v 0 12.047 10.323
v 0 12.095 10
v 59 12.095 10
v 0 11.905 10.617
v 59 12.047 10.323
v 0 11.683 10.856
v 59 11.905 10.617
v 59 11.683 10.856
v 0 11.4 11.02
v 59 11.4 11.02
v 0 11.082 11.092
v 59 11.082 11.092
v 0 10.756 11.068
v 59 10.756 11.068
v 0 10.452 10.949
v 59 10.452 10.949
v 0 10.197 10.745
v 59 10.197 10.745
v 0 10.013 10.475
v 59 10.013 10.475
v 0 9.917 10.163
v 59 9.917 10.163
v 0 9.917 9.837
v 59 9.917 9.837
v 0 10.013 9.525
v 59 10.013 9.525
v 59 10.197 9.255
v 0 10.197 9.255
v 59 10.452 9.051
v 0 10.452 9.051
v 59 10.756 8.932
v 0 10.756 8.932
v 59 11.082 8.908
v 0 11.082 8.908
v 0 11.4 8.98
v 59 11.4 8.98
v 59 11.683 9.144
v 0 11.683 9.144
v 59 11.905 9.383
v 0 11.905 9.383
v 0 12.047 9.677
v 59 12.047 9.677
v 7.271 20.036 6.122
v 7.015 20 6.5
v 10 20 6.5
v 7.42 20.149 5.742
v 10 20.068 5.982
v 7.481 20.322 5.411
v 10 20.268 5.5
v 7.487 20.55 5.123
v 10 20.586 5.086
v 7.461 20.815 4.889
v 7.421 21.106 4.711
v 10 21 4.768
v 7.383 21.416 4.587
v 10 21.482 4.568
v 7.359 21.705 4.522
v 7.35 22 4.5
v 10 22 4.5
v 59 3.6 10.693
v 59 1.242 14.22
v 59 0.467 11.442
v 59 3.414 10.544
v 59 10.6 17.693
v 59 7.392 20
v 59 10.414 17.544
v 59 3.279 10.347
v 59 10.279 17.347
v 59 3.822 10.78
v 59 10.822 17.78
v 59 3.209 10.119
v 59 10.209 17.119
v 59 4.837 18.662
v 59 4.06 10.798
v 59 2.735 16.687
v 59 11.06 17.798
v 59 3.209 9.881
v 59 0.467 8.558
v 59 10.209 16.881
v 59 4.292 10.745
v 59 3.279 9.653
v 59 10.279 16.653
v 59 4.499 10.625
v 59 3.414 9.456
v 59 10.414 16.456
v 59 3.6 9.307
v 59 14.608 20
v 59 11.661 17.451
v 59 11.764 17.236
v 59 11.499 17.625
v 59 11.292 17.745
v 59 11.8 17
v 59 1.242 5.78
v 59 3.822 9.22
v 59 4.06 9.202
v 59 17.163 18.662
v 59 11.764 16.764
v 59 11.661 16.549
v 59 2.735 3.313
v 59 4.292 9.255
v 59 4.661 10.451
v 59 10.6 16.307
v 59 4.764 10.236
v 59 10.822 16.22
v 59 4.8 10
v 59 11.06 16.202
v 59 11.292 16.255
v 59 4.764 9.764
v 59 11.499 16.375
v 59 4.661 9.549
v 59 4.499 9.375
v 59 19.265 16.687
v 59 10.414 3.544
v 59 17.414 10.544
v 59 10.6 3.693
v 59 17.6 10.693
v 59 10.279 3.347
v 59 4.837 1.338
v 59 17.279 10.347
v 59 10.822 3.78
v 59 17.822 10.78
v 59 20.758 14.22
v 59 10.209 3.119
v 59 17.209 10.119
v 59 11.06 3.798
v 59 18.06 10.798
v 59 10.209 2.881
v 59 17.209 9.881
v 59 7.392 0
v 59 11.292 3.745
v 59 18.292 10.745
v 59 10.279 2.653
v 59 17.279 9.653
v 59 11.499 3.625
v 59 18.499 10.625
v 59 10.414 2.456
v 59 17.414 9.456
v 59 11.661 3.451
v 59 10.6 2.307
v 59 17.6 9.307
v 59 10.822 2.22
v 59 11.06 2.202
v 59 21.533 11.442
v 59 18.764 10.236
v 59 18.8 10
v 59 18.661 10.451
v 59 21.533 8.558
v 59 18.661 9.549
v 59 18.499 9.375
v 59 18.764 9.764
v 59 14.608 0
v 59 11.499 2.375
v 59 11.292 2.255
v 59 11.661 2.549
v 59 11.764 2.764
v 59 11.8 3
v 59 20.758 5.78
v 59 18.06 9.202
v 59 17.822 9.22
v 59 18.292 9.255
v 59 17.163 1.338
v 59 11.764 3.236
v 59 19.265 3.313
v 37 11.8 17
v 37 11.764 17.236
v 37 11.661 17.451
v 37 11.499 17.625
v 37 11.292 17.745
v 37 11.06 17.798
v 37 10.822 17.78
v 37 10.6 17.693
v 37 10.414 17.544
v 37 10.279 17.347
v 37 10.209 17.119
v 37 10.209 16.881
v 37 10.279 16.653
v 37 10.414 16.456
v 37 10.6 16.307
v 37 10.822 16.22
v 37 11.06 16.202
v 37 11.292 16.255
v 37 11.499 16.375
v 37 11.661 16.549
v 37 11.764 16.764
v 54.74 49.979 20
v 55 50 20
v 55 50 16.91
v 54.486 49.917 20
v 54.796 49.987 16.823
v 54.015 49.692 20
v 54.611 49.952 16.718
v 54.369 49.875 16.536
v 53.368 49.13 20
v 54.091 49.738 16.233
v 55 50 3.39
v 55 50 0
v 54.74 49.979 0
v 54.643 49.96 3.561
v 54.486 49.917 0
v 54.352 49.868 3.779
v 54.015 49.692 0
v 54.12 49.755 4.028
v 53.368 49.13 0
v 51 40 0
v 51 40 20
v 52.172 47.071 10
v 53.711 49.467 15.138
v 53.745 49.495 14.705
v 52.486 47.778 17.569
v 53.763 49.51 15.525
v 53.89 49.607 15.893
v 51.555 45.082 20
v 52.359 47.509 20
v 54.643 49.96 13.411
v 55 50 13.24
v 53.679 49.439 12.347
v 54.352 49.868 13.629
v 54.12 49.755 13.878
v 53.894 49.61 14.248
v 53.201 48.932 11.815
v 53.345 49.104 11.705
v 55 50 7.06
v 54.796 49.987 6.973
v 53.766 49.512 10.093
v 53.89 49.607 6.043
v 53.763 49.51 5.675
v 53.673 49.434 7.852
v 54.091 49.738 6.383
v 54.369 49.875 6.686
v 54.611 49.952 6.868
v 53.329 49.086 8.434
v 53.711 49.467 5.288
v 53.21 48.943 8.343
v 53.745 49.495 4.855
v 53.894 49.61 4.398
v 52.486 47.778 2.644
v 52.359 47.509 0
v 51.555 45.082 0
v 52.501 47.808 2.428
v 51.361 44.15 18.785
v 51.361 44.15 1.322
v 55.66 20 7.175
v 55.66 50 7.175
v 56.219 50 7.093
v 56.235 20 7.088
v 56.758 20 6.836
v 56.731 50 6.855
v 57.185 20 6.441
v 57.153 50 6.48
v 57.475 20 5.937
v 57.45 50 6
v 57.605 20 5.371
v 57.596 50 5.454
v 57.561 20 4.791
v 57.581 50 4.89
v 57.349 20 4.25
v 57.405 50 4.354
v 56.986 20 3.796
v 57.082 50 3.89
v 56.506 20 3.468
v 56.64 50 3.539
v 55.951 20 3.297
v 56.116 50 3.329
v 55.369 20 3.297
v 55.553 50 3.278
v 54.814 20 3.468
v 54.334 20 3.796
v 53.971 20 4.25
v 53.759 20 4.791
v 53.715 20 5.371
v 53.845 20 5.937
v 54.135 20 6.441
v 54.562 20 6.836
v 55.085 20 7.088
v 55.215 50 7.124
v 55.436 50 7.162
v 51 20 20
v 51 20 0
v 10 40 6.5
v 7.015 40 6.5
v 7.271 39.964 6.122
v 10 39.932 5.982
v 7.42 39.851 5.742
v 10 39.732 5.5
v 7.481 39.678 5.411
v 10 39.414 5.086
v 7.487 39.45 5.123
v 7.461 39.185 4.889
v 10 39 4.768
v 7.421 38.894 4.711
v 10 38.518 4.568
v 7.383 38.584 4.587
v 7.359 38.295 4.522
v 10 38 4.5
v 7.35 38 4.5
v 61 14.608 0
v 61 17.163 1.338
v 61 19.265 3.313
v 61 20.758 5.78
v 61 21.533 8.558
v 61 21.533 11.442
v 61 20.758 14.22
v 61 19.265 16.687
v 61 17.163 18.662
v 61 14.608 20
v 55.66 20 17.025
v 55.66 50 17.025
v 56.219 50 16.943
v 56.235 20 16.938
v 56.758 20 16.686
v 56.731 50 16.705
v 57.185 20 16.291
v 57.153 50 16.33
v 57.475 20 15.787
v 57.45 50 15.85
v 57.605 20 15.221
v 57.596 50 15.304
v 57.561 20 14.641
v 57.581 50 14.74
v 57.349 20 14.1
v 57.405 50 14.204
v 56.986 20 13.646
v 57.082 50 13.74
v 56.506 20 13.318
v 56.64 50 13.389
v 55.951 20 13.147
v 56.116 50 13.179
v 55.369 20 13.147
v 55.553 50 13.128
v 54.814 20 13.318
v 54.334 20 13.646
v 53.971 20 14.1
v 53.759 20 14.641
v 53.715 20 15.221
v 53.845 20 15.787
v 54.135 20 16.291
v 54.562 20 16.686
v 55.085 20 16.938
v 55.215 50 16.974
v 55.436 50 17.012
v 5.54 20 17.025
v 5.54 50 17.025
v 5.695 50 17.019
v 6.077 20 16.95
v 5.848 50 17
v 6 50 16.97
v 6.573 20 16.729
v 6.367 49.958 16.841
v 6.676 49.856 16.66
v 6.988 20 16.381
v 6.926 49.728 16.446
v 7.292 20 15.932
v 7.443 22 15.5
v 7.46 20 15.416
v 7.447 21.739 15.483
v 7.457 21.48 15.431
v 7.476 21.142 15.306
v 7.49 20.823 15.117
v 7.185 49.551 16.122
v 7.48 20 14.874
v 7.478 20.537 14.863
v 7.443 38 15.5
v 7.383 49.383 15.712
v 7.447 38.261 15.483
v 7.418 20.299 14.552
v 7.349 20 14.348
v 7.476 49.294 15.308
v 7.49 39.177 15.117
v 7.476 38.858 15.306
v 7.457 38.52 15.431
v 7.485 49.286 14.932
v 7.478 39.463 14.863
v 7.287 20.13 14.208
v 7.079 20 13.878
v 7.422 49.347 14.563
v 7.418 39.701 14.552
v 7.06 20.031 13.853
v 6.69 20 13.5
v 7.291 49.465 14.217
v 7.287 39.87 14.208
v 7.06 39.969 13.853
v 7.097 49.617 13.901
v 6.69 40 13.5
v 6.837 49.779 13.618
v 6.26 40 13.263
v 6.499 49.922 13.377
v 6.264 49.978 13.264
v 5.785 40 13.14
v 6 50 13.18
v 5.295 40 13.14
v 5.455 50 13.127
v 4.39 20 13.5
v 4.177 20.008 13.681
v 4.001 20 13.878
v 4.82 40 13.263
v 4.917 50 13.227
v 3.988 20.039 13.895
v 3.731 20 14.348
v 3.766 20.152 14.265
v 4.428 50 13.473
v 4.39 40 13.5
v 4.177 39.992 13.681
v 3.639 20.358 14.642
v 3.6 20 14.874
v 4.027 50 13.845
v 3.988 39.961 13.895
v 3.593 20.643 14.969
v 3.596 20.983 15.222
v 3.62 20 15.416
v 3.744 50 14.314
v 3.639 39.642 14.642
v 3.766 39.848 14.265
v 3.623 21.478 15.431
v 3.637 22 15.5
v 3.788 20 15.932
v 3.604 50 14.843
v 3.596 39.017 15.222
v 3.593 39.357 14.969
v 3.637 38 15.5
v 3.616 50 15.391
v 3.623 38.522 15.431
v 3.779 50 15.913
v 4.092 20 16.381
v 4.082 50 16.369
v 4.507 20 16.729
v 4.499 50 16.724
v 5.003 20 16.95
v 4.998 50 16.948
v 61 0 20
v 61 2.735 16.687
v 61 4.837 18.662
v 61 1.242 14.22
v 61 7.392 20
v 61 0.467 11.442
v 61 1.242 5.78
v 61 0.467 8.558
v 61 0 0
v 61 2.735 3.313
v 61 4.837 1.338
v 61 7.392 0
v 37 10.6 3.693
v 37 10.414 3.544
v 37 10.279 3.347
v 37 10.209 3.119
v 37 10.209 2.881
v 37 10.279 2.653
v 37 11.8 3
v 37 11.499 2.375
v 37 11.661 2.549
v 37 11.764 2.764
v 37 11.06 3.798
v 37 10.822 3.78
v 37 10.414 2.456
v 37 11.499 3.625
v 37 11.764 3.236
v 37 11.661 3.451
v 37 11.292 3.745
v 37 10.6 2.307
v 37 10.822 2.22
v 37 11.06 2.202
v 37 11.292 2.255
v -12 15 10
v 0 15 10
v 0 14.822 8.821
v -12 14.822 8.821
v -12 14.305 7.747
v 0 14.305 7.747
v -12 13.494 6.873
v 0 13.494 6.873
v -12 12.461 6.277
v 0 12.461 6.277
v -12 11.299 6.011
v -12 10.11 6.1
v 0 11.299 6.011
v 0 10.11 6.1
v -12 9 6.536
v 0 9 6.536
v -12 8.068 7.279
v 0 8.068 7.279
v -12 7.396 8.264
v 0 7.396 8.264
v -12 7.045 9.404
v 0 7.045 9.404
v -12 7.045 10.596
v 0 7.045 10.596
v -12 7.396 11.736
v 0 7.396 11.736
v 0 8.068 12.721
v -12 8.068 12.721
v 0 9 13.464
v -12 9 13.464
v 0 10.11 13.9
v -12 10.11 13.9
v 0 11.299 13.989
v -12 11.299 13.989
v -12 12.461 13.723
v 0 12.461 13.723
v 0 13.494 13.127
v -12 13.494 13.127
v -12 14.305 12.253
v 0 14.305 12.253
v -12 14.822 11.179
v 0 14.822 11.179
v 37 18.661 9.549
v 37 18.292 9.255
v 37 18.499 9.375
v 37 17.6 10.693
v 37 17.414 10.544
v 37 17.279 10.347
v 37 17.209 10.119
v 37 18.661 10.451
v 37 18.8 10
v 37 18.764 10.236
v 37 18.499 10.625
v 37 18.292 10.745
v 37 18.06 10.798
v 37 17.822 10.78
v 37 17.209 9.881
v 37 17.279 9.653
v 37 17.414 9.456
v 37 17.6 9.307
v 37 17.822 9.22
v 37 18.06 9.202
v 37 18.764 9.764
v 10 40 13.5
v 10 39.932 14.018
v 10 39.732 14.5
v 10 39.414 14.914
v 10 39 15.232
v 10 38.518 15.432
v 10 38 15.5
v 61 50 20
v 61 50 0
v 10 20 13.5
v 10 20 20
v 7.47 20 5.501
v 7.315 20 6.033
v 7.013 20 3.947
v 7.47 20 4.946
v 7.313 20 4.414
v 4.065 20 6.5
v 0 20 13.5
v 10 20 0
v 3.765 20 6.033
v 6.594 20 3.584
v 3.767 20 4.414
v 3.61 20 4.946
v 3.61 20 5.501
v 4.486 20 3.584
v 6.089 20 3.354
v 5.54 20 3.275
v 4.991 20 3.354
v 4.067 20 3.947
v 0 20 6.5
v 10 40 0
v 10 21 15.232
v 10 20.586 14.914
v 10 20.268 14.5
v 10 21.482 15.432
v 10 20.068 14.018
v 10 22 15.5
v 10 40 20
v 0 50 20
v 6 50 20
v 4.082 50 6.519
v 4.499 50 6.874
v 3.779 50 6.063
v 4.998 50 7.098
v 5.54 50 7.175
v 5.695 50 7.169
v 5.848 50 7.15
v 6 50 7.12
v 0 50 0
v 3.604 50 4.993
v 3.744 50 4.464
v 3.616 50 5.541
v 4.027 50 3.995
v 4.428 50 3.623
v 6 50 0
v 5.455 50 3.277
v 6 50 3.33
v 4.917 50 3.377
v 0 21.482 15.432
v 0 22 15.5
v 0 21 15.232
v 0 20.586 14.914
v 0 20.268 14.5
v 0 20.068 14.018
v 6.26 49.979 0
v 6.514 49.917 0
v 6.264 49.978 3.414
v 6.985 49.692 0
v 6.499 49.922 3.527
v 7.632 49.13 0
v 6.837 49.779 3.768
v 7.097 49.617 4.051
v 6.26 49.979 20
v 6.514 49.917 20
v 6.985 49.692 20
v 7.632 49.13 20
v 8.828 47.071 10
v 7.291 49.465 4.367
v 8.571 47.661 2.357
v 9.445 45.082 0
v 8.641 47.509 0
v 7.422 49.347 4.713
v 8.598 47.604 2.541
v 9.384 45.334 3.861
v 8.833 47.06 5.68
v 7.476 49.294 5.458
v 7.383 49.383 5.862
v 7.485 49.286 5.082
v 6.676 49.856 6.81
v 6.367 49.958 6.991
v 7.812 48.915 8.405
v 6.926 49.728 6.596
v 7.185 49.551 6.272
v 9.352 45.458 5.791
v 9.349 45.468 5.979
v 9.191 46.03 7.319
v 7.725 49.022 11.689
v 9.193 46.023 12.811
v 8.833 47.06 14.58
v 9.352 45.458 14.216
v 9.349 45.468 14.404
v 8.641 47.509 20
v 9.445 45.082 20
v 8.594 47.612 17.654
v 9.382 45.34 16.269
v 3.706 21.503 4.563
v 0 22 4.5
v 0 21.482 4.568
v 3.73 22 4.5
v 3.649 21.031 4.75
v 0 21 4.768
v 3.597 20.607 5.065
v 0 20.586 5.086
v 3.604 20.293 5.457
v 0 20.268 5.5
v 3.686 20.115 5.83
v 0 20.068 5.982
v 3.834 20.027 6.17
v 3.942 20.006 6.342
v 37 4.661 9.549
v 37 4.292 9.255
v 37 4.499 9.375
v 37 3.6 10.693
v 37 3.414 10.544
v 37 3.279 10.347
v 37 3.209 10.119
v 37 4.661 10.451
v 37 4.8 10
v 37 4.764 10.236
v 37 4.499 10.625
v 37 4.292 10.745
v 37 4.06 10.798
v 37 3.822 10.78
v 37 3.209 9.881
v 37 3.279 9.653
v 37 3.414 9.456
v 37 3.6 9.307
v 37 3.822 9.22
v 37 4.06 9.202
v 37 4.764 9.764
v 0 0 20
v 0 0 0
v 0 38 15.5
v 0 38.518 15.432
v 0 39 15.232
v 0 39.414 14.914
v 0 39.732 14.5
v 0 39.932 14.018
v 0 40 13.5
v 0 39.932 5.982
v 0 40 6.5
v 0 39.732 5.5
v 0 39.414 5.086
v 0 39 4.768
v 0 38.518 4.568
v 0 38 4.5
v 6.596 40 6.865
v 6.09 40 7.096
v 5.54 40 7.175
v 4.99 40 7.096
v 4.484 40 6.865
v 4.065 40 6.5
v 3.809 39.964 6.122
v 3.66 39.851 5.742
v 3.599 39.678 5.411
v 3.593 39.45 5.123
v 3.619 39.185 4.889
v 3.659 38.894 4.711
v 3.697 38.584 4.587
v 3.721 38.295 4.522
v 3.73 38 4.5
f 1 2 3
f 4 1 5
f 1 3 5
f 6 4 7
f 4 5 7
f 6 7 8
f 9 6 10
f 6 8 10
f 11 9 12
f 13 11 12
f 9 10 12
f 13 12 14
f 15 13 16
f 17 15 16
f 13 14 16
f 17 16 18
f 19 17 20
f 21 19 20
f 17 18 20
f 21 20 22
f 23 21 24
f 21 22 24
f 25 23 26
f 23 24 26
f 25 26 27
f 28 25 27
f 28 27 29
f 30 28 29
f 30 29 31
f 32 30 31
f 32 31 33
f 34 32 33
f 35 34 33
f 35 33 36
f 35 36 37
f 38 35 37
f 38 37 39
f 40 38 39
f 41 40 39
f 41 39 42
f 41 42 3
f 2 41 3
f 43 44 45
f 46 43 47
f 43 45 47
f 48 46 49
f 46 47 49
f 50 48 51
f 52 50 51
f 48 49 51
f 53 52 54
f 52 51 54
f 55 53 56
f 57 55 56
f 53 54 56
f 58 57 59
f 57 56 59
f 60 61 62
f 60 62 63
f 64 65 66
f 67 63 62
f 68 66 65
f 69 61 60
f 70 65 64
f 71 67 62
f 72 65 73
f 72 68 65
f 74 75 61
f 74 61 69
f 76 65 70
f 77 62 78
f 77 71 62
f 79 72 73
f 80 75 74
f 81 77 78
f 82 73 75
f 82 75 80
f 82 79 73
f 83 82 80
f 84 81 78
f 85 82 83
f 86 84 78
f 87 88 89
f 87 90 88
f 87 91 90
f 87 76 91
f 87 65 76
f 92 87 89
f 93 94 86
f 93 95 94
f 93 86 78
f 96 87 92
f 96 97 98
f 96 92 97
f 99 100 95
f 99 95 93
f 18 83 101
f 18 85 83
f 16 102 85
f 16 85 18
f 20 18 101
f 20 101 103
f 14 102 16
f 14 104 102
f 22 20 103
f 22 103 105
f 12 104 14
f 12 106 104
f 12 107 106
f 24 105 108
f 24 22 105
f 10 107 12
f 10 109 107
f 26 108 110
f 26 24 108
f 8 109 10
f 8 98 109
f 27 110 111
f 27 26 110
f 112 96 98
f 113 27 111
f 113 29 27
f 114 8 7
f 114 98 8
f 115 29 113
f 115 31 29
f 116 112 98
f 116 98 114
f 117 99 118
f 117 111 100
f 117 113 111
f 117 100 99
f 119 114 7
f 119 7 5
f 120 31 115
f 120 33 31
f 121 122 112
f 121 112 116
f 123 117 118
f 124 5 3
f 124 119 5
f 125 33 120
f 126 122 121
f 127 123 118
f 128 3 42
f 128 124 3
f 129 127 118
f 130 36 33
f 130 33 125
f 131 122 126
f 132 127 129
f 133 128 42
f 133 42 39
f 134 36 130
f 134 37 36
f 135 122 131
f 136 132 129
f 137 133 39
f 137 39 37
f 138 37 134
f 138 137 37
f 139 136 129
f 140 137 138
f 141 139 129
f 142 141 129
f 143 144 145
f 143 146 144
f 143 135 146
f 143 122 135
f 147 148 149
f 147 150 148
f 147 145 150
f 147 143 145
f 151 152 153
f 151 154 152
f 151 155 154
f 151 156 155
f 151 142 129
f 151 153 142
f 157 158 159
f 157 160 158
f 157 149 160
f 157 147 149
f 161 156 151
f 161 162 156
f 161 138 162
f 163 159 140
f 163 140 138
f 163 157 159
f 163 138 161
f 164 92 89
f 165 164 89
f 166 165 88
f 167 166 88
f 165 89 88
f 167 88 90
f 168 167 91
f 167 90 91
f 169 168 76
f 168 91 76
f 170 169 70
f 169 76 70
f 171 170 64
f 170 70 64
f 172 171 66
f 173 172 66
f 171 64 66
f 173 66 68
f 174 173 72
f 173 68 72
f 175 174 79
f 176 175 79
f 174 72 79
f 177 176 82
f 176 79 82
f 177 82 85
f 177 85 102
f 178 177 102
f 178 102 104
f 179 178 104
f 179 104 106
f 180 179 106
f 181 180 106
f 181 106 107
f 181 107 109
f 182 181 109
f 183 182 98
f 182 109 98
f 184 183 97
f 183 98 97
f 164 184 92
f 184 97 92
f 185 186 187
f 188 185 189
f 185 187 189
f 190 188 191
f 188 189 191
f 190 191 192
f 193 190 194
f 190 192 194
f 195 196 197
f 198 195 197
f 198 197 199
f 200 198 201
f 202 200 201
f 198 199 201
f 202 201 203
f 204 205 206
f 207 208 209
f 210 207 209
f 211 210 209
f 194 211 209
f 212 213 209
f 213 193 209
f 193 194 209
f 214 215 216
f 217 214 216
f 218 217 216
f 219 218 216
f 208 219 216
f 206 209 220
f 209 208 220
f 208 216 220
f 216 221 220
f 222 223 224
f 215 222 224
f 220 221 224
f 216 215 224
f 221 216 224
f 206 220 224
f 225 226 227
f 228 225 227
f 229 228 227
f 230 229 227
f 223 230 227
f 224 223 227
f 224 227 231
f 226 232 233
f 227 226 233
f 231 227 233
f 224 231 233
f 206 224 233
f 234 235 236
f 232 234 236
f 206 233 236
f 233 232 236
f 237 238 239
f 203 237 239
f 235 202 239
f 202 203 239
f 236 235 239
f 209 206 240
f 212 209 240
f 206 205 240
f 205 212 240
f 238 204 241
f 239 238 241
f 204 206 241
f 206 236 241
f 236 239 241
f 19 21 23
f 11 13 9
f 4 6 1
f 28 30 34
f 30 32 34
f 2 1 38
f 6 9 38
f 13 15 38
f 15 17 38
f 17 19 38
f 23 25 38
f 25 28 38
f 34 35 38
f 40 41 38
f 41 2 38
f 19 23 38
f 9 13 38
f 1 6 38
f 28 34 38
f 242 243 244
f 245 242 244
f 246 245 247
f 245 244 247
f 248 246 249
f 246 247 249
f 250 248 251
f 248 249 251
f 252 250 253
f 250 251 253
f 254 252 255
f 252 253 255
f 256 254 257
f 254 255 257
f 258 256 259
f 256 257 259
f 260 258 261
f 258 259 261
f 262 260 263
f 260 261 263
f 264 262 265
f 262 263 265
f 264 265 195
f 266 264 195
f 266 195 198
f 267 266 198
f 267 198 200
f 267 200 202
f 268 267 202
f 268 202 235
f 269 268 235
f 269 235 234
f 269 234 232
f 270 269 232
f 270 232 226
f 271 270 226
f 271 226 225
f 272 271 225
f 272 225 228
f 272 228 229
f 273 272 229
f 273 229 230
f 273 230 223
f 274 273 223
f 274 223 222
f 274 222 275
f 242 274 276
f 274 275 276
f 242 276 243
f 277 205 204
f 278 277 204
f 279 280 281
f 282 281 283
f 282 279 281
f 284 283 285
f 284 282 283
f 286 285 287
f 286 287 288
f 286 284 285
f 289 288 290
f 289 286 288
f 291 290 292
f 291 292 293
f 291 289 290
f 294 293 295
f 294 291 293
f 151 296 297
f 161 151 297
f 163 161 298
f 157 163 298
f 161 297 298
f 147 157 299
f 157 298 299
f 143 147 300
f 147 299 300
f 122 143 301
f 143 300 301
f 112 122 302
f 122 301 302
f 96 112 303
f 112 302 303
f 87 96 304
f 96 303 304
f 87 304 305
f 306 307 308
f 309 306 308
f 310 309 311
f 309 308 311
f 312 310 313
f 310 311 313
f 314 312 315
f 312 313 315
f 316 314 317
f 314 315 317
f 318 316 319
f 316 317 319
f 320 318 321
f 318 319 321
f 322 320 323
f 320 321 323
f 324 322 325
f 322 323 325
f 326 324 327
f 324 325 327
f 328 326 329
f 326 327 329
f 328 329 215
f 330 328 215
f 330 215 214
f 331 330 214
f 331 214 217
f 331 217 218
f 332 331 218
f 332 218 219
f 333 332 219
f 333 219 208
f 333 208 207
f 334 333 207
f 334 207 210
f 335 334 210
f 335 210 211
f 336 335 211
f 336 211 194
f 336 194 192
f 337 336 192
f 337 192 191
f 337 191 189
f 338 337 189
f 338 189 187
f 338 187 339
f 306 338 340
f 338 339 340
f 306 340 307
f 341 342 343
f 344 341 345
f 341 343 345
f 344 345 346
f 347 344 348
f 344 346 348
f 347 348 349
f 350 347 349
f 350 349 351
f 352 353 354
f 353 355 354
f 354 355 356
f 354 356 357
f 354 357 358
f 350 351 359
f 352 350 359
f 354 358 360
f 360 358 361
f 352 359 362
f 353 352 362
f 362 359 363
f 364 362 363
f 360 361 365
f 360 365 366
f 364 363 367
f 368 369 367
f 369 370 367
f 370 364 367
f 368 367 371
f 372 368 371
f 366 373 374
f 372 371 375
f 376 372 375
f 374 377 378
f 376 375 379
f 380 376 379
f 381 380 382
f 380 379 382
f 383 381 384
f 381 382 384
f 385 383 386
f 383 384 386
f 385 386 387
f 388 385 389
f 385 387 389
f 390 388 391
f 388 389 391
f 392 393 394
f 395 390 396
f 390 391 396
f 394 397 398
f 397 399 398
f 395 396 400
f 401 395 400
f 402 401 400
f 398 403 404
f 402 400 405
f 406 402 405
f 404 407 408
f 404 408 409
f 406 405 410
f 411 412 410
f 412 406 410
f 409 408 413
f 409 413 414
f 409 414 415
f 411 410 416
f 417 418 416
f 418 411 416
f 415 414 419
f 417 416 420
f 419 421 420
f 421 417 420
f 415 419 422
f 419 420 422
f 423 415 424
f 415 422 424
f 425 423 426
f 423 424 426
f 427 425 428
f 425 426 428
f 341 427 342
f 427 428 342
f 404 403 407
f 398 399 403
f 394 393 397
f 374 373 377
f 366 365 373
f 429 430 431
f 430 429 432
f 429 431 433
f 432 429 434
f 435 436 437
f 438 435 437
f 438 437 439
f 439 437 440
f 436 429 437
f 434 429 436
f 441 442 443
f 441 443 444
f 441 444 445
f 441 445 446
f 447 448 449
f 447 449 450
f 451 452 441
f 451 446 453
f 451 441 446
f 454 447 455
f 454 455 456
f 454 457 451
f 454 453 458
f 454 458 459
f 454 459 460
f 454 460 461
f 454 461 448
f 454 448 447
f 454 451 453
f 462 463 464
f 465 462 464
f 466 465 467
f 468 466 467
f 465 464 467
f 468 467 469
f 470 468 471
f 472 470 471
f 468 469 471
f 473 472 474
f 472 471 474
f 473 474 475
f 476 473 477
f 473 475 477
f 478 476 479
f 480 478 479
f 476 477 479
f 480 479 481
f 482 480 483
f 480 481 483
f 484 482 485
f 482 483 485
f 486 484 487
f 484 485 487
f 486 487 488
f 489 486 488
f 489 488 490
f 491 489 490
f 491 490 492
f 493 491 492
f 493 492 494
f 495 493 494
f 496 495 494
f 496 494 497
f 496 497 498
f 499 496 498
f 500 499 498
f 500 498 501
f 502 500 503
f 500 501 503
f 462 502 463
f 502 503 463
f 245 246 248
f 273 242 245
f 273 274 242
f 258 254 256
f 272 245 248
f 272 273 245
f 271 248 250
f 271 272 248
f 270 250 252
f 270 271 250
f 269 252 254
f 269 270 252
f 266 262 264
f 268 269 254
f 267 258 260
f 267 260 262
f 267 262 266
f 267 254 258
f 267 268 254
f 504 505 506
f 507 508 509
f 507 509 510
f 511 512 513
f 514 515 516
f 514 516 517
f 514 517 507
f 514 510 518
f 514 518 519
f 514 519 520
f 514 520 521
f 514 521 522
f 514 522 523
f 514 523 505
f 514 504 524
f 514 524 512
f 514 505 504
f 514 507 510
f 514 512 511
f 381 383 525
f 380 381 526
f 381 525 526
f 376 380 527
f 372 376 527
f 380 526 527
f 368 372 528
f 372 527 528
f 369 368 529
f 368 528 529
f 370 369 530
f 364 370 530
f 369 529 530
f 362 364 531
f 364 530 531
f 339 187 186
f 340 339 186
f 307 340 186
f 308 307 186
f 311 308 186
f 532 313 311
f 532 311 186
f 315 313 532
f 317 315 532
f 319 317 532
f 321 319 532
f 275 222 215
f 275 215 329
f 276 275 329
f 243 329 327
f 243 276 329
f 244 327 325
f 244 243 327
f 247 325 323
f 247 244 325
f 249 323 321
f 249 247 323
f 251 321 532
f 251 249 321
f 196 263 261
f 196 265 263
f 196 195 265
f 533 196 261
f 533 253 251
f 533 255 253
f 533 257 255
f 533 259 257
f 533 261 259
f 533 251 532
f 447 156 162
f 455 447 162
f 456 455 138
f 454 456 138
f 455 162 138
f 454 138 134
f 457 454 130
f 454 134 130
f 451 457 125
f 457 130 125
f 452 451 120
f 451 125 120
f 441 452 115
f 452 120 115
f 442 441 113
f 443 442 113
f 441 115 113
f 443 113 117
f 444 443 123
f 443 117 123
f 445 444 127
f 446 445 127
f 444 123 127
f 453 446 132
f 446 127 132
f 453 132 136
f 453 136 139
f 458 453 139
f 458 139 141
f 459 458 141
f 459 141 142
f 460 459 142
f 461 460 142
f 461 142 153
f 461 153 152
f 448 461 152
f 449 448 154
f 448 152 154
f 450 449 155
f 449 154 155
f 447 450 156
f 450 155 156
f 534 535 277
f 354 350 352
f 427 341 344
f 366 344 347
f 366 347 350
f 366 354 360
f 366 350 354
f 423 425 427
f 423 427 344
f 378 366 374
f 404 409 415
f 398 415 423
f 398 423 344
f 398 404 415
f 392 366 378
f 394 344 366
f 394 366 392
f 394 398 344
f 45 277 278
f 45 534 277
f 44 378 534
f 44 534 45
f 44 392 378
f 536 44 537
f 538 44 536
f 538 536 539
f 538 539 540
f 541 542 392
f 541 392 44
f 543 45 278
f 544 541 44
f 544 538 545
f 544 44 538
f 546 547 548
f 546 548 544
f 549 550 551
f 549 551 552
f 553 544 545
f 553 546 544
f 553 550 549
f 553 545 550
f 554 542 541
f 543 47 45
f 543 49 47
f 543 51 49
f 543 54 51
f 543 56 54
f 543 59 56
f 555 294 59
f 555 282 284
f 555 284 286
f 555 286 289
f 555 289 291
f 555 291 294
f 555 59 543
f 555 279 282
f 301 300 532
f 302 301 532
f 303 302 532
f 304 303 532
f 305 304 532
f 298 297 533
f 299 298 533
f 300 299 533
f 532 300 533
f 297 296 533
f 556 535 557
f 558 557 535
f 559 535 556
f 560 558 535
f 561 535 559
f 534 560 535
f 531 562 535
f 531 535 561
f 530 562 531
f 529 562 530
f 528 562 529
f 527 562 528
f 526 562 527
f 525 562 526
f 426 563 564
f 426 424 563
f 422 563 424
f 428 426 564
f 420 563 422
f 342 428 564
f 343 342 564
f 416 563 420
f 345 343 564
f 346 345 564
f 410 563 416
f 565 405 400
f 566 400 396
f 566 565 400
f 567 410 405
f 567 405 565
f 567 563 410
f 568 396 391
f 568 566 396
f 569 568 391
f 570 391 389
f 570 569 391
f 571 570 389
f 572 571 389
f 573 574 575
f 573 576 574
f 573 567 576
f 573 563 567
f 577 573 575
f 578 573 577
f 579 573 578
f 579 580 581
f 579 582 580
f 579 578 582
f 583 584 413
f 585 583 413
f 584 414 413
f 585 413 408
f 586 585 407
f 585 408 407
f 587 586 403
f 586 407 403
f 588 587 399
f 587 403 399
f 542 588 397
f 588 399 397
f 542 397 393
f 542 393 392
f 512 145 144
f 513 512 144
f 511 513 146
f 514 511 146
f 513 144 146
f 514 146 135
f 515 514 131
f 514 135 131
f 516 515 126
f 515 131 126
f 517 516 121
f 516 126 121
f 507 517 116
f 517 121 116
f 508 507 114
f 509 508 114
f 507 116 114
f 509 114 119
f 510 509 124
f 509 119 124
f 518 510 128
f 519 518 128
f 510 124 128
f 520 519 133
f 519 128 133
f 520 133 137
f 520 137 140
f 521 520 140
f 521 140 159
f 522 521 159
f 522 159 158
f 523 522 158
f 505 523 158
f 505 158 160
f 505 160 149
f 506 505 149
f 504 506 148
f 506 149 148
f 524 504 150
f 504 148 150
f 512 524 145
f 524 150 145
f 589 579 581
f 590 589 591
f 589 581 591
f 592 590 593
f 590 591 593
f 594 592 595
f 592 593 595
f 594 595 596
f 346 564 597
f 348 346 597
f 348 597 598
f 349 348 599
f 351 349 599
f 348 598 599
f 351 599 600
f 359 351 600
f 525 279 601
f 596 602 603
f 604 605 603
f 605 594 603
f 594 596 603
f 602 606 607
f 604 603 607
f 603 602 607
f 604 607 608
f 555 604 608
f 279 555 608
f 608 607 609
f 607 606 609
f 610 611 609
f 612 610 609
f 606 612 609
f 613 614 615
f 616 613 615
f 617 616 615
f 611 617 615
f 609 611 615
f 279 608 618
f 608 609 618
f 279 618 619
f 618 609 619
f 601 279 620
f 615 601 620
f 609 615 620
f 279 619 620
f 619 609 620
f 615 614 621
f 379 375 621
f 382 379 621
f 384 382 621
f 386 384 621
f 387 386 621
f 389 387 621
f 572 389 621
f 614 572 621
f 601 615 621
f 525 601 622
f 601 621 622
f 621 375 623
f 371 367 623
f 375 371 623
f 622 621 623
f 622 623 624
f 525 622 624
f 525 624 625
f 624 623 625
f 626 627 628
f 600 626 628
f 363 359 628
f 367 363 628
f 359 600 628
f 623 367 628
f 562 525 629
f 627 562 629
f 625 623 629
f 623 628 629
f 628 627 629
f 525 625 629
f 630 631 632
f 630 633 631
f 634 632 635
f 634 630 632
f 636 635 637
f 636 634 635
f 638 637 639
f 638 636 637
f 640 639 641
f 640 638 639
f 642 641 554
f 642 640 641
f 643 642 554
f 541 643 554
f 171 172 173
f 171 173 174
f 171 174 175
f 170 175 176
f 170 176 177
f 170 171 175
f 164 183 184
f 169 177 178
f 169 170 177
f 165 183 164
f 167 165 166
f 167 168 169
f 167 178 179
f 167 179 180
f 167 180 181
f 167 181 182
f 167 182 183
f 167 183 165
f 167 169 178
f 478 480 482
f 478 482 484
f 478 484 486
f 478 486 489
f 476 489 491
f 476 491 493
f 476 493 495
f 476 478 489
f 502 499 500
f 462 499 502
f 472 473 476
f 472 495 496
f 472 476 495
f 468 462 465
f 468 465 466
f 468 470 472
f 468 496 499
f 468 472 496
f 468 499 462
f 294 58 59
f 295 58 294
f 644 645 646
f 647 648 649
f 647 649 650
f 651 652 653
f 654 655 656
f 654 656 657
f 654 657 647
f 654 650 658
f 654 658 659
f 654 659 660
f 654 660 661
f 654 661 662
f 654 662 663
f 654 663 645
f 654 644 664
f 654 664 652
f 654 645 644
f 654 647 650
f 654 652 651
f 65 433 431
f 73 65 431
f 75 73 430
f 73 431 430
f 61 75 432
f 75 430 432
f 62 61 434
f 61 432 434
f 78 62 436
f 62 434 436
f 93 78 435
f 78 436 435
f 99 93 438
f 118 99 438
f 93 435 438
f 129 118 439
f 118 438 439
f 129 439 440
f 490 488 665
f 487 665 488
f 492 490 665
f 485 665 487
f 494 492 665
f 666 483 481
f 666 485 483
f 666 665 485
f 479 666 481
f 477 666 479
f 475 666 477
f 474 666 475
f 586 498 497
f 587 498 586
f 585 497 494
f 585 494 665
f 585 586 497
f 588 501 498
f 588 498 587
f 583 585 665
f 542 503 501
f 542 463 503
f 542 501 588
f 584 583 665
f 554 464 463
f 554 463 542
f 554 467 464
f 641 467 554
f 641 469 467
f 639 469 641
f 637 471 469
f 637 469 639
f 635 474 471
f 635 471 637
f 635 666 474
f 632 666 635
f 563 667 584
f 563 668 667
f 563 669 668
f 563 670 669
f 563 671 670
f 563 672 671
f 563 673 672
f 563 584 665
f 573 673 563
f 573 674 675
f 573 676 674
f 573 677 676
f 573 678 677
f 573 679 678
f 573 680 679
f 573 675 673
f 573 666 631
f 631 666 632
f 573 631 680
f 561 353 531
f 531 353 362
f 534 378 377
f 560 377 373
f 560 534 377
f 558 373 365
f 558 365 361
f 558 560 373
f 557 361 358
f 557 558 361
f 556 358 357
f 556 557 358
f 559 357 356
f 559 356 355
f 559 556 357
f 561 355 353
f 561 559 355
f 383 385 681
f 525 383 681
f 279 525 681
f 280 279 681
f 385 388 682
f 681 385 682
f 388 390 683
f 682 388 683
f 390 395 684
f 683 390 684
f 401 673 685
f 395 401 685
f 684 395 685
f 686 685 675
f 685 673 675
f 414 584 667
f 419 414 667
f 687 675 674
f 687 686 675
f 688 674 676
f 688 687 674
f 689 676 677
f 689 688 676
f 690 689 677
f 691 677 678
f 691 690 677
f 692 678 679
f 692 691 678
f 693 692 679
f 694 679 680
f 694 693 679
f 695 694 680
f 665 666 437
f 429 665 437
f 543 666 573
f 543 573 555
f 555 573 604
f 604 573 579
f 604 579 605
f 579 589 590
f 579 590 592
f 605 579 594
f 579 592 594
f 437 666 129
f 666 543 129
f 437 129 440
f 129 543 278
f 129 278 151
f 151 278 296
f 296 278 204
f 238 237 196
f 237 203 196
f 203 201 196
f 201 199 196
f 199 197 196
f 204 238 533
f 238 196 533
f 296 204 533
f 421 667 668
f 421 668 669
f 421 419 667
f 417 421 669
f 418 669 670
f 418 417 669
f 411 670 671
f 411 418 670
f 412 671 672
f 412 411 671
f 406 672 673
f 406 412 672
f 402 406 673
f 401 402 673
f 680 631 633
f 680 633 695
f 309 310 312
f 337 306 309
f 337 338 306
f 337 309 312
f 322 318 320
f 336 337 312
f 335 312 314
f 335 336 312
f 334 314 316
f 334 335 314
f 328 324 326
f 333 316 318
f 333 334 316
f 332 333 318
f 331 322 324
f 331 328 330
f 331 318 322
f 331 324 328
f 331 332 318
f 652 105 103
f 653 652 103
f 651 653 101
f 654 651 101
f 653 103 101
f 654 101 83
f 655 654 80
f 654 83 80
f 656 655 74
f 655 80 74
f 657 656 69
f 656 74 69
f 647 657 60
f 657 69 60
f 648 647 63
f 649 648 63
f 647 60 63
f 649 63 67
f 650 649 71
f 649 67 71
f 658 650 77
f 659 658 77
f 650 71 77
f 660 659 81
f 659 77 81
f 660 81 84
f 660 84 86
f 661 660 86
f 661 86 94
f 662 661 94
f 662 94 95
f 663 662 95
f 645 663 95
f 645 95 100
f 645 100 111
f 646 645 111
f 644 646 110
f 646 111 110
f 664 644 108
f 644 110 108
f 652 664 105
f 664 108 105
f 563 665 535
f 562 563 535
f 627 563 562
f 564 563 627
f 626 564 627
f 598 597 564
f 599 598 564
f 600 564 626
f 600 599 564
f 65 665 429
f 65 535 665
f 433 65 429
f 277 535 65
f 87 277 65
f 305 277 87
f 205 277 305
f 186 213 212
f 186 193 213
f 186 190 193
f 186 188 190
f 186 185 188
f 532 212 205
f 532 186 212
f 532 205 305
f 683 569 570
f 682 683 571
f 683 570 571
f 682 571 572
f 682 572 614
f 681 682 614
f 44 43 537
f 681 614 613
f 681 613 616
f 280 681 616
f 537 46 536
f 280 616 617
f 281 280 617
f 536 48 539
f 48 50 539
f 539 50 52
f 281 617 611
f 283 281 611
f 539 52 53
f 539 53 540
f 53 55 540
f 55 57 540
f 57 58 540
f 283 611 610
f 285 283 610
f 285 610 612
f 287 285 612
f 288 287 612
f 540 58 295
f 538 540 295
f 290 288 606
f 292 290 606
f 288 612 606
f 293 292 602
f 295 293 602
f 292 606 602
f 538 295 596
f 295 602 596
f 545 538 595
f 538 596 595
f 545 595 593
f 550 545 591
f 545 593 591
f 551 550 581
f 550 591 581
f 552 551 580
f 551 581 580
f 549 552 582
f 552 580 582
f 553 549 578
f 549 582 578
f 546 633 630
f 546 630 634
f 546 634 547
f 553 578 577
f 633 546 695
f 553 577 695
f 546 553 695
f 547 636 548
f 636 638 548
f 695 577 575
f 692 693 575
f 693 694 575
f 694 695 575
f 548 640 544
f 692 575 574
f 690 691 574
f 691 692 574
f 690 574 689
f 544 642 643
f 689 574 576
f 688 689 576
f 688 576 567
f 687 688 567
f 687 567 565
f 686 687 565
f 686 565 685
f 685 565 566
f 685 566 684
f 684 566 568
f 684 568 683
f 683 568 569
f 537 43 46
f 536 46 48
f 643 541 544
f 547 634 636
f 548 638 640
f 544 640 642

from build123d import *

# Parameters (mm, degrees)
SKIZZE1_W                       = 61
SKIZZE1_H                       = 50
AUFSATZ_LINEAR_AUSTRAGEN1_DEPTH = 20
SKIZZE2_W                       = 41
SKIZZE2_H                       = 20
SCHNITT_LINEAR_AUSTRAGEN1_DEPTH = 30
SCHNITT_LINEAR_START            = -61
SKIZZE3_W                       = 11
SKIZZE3_H                       = 20
SCHNITT_LINEAR_AUSTRAGEN2_DEPTH = 10
SCHNITT_LINEAR_AUSTRAGEN3_REACH = 83.37
SKIZZE4_R                       = 1.95
VERRUNDUNG1_SIZE                = 4
VERRUNDUNG1_SIZE_2              = 10
VERRUNDUNG2_R                   = 2
SKIZZE6_R                       = 10.631095309
SCHNITT_LINEAR_AUSTRAGEN4_DEPTH = 2
SKIZZE7_R                       = 0.8
SCHNITT_LINEAR_AUSTRAGEN5_DEPTH = 22
SKIZZE10_R                      = 1.095488433
SCHNITT_LINEAR_AUSTRAGEN6_DEPTH = 63
SKIZZE11_R                      = 4
AUFSATZ_LINEAR_AUSTRAGEN3_DEPTH = 12


with BuildPart() as part:
    # Skizze1 → Aufsatz-Linear austragen1 (new body)
    with BuildSketch(Plane.XY):
        with Locations((30.5, 25)):
            Rectangle(SKIZZE1_W, SKIZZE1_H)
    extrude(amount=AUFSATZ_LINEAR_AUSTRAGEN1_DEPTH)

    # Skizze2 → Schnitt-Linear austragen1 (cut)
    with BuildSketch(Plane(origin=(0, 50, 0), x_dir=(1, 0, 0), z_dir=(0, 1, 0))):
        with Locations((30.5, -10)):
            Rectangle(SKIZZE2_W, SKIZZE2_H)
    extrude(amount=-SCHNITT_LINEAR_AUSTRAGEN1_DEPTH, mode=Mode.SUBTRACT)

    # Skizze3 → Schnitt-Linear austragen2 (cut)
    with BuildSketch(Plane(origin=(61, 0, 0), x_dir=(0, 0, -1), z_dir=(1, 0, 0)).offset(SCHNITT_LINEAR_START)):
        with Locations((-10, 30)):
            Rectangle(SKIZZE3_W, SKIZZE3_H)
    extrude(amount=SCHNITT_LINEAR_AUSTRAGEN2_DEPTH, mode=Mode.SUBTRACT)

    # Schnitt-Linear austragen3: up to this face of the body (flat: up to its plane)
    schnitt_linear_austragen3_end = Plane(part.part.faces().sort_by_distance((27.483870968, 20, 10))[0])
    # Skizze4 → Schnitt-Linear austragen3 (cut, up to the picked face)
    with BuildSketch(Plane(origin=(0, 50, 0), x_dir=(1, 0, 0), z_dir=(0, 1, 0)), mode=Mode.PRIVATE) as schnitt_linear_austragen3_sk1:
        with Locations(Location((5.54, -5.225, 0), (0, 0, 270))):
            Circle(SKIZZE4_R)
    schnitt_linear_austragen3_tool1 = split(extrude(schnitt_linear_austragen3_sk1.sketch, amount=-SCHNITT_LINEAR_AUSTRAGEN3_REACH, mode=Mode.PRIVATE), bisect_by=schnitt_linear_austragen3_end, keep=Keep.BOTH, mode=Mode.PRIVATE)
    # Skizze4 → Schnitt-Linear austragen3 (cut, up to the picked face)
    with BuildSketch(Plane(origin=(0, 50, 0), x_dir=(1, 0, 0), z_dir=(0, 1, 0)), mode=Mode.PRIVATE) as schnitt_linear_austragen3_sk2:
        with Locations(Location((5.54, -15.075, 0), (0, 0, 270))):
            Circle(SKIZZE4_R)
    schnitt_linear_austragen3_tool2 = split(extrude(schnitt_linear_austragen3_sk2.sketch, amount=-SCHNITT_LINEAR_AUSTRAGEN3_REACH, mode=Mode.PRIVATE), bisect_by=schnitt_linear_austragen3_end, keep=Keep.BOTH, mode=Mode.PRIVATE)
    # Skizze4 → Schnitt-Linear austragen3 (cut, up to the picked face)
    with BuildSketch(Plane(origin=(0, 50, 0), x_dir=(1, 0, 0), z_dir=(0, 1, 0)), mode=Mode.PRIVATE) as schnitt_linear_austragen3_sk3:
        with Locations(Location((55.66, -15.075, 0), (0, 0, 270))):
            Circle(SKIZZE4_R)
    schnitt_linear_austragen3_tool3 = split(extrude(schnitt_linear_austragen3_sk3.sketch, amount=-SCHNITT_LINEAR_AUSTRAGEN3_REACH, mode=Mode.PRIVATE), bisect_by=schnitt_linear_austragen3_end, keep=Keep.BOTH, mode=Mode.PRIVATE)
    # Skizze4 → Schnitt-Linear austragen3 (cut, up to the picked face)
    with BuildSketch(Plane(origin=(0, 50, 0), x_dir=(1, 0, 0), z_dir=(0, 1, 0)), mode=Mode.PRIVATE) as schnitt_linear_austragen3_sk4:
        with Locations(Location((55.66, -5.225, 0), (0, 0, 270))):
            Circle(SKIZZE4_R)
    schnitt_linear_austragen3_tool4 = split(extrude(schnitt_linear_austragen3_sk4.sketch, amount=-SCHNITT_LINEAR_AUSTRAGEN3_REACH, mode=Mode.PRIVATE), bisect_by=schnitt_linear_austragen3_end, keep=Keep.BOTH, mode=Mode.PRIVATE)
    add(schnitt_linear_austragen3_tool1.solids().sort_by(Axis((5.54, 50, 5.225), (0, -1, 0)))[0], mode=Mode.SUBTRACT)
    add(schnitt_linear_austragen3_tool2.solids().sort_by(Axis((5.54, 50, 15.075), (0, -1, 0)))[0], mode=Mode.SUBTRACT)
    add(schnitt_linear_austragen3_tool3.solids().sort_by(Axis((55.66, 50, 15.075), (0, -1, 0)))[0], mode=Mode.SUBTRACT)
    add(schnitt_linear_austragen3_tool4.solids().sort_by(Axis((55.66, 50, 5.225), (0, -1, 0)))[0], mode=Mode.SUBTRACT)

    # Verrundung1
    # an asymmetric fillet: 10, 4 mm, written as the material it takes off along each edge
    with BuildSketch(Plane(origin=(51, 50, -25), x_dir=(1, 0, 0), z_dir=(0, 0, 1)), Plane(origin=(10, 50, 45), x_dir=(-1, 0, 0), z_dir=(0, 0, -1))) as verrundung1_piece_1:
        with BuildLine():
            Bezier((VERRUNDUNG1_SIZE, 0), (0, 0), (0, -VERRUNDUNG1_SIZE_2), weights=[1, 0.707106781, 1])
            Line((0, -VERRUNDUNG1_SIZE_2), (0, 0))
            Line((0, 0), (VERRUNDUNG1_SIZE, 0))
        make_face()
    extrude(amount=70, mode=Mode.SUBTRACT)

    # Verrundung2
    verrundung2_edges = [part.edges().sort_by_distance(p)[0] for p in [
        (1.818438783, 40, 15.5),
        (8.721561217, 40, 15.5),
        (8.675107038, 40, 4.5),
        (1.864892962, 40, 4.5),
        (8.721561217, 20, 15.5),
        (1.818438783, 20, 15.5),
        (8.675107038, 20, 4.5),
        (1.864892962, 20, 4.5),
    ]]
    fillet(verrundung2_edges, radius=VERRUNDUNG2_R)

    # Skizze6 → Schnitt-Linear austragen4 (cut)
    with BuildSketch(Plane(origin=(61, 0, 0), x_dir=(0, 0, -1), z_dir=(1, 0, 0))):
        with Locations((-10, 11)):
            Circle(SKIZZE6_R)
    extrude(amount=-SCHNITT_LINEAR_AUSTRAGEN4_DEPTH, mode=Mode.SUBTRACT)

    # Skizze7 → Schnitt-Linear austragen5 (cut)
    with BuildSketch(Plane(origin=(59, 0, 0), x_dir=(0, 0, -1), z_dir=(1, 0, 0))):
        with Locations(Location((-10, 18, 0), (0, 0, 90))):
            Circle(SKIZZE7_R)
        with Locations(Location((-3, 11, 0), (0, 0, 90))):
            Circle(SKIZZE7_R)
        with Locations(Location((-10, 4, 0), (0, 0, 90))):
            Circle(SKIZZE7_R)
        with Locations(Location((-17, 11, 0), (0, 0, 90))):
            Circle(SKIZZE7_R)
    extrude(amount=-SCHNITT_LINEAR_AUSTRAGEN5_DEPTH, mode=Mode.SUBTRACT)

    # Skizze10 → Schnitt-Linear austragen6 (cut)
    with BuildSketch(Plane(origin=(59, 0, 0), x_dir=(0, 0, -1), z_dir=(1, 0, 0))):
        with Locations(Location((-10, 11, 0), (0, 0, 90))):
            Circle(SKIZZE10_R)
    extrude(amount=-SCHNITT_LINEAR_AUSTRAGEN6_DEPTH, mode=Mode.SUBTRACT)

    # Skizze11 → Aufsatz-Linear austragen3 (add)
    with BuildSketch(Plane.ZY):
        with Locations(Location((10, 11, 0), (0, 0, 90))):
            Circle(SKIZZE11_R)
    extrude(amount=AUFSATZ_LINEAR_AUSTRAGEN3_DEPTH)


solid = part.part
